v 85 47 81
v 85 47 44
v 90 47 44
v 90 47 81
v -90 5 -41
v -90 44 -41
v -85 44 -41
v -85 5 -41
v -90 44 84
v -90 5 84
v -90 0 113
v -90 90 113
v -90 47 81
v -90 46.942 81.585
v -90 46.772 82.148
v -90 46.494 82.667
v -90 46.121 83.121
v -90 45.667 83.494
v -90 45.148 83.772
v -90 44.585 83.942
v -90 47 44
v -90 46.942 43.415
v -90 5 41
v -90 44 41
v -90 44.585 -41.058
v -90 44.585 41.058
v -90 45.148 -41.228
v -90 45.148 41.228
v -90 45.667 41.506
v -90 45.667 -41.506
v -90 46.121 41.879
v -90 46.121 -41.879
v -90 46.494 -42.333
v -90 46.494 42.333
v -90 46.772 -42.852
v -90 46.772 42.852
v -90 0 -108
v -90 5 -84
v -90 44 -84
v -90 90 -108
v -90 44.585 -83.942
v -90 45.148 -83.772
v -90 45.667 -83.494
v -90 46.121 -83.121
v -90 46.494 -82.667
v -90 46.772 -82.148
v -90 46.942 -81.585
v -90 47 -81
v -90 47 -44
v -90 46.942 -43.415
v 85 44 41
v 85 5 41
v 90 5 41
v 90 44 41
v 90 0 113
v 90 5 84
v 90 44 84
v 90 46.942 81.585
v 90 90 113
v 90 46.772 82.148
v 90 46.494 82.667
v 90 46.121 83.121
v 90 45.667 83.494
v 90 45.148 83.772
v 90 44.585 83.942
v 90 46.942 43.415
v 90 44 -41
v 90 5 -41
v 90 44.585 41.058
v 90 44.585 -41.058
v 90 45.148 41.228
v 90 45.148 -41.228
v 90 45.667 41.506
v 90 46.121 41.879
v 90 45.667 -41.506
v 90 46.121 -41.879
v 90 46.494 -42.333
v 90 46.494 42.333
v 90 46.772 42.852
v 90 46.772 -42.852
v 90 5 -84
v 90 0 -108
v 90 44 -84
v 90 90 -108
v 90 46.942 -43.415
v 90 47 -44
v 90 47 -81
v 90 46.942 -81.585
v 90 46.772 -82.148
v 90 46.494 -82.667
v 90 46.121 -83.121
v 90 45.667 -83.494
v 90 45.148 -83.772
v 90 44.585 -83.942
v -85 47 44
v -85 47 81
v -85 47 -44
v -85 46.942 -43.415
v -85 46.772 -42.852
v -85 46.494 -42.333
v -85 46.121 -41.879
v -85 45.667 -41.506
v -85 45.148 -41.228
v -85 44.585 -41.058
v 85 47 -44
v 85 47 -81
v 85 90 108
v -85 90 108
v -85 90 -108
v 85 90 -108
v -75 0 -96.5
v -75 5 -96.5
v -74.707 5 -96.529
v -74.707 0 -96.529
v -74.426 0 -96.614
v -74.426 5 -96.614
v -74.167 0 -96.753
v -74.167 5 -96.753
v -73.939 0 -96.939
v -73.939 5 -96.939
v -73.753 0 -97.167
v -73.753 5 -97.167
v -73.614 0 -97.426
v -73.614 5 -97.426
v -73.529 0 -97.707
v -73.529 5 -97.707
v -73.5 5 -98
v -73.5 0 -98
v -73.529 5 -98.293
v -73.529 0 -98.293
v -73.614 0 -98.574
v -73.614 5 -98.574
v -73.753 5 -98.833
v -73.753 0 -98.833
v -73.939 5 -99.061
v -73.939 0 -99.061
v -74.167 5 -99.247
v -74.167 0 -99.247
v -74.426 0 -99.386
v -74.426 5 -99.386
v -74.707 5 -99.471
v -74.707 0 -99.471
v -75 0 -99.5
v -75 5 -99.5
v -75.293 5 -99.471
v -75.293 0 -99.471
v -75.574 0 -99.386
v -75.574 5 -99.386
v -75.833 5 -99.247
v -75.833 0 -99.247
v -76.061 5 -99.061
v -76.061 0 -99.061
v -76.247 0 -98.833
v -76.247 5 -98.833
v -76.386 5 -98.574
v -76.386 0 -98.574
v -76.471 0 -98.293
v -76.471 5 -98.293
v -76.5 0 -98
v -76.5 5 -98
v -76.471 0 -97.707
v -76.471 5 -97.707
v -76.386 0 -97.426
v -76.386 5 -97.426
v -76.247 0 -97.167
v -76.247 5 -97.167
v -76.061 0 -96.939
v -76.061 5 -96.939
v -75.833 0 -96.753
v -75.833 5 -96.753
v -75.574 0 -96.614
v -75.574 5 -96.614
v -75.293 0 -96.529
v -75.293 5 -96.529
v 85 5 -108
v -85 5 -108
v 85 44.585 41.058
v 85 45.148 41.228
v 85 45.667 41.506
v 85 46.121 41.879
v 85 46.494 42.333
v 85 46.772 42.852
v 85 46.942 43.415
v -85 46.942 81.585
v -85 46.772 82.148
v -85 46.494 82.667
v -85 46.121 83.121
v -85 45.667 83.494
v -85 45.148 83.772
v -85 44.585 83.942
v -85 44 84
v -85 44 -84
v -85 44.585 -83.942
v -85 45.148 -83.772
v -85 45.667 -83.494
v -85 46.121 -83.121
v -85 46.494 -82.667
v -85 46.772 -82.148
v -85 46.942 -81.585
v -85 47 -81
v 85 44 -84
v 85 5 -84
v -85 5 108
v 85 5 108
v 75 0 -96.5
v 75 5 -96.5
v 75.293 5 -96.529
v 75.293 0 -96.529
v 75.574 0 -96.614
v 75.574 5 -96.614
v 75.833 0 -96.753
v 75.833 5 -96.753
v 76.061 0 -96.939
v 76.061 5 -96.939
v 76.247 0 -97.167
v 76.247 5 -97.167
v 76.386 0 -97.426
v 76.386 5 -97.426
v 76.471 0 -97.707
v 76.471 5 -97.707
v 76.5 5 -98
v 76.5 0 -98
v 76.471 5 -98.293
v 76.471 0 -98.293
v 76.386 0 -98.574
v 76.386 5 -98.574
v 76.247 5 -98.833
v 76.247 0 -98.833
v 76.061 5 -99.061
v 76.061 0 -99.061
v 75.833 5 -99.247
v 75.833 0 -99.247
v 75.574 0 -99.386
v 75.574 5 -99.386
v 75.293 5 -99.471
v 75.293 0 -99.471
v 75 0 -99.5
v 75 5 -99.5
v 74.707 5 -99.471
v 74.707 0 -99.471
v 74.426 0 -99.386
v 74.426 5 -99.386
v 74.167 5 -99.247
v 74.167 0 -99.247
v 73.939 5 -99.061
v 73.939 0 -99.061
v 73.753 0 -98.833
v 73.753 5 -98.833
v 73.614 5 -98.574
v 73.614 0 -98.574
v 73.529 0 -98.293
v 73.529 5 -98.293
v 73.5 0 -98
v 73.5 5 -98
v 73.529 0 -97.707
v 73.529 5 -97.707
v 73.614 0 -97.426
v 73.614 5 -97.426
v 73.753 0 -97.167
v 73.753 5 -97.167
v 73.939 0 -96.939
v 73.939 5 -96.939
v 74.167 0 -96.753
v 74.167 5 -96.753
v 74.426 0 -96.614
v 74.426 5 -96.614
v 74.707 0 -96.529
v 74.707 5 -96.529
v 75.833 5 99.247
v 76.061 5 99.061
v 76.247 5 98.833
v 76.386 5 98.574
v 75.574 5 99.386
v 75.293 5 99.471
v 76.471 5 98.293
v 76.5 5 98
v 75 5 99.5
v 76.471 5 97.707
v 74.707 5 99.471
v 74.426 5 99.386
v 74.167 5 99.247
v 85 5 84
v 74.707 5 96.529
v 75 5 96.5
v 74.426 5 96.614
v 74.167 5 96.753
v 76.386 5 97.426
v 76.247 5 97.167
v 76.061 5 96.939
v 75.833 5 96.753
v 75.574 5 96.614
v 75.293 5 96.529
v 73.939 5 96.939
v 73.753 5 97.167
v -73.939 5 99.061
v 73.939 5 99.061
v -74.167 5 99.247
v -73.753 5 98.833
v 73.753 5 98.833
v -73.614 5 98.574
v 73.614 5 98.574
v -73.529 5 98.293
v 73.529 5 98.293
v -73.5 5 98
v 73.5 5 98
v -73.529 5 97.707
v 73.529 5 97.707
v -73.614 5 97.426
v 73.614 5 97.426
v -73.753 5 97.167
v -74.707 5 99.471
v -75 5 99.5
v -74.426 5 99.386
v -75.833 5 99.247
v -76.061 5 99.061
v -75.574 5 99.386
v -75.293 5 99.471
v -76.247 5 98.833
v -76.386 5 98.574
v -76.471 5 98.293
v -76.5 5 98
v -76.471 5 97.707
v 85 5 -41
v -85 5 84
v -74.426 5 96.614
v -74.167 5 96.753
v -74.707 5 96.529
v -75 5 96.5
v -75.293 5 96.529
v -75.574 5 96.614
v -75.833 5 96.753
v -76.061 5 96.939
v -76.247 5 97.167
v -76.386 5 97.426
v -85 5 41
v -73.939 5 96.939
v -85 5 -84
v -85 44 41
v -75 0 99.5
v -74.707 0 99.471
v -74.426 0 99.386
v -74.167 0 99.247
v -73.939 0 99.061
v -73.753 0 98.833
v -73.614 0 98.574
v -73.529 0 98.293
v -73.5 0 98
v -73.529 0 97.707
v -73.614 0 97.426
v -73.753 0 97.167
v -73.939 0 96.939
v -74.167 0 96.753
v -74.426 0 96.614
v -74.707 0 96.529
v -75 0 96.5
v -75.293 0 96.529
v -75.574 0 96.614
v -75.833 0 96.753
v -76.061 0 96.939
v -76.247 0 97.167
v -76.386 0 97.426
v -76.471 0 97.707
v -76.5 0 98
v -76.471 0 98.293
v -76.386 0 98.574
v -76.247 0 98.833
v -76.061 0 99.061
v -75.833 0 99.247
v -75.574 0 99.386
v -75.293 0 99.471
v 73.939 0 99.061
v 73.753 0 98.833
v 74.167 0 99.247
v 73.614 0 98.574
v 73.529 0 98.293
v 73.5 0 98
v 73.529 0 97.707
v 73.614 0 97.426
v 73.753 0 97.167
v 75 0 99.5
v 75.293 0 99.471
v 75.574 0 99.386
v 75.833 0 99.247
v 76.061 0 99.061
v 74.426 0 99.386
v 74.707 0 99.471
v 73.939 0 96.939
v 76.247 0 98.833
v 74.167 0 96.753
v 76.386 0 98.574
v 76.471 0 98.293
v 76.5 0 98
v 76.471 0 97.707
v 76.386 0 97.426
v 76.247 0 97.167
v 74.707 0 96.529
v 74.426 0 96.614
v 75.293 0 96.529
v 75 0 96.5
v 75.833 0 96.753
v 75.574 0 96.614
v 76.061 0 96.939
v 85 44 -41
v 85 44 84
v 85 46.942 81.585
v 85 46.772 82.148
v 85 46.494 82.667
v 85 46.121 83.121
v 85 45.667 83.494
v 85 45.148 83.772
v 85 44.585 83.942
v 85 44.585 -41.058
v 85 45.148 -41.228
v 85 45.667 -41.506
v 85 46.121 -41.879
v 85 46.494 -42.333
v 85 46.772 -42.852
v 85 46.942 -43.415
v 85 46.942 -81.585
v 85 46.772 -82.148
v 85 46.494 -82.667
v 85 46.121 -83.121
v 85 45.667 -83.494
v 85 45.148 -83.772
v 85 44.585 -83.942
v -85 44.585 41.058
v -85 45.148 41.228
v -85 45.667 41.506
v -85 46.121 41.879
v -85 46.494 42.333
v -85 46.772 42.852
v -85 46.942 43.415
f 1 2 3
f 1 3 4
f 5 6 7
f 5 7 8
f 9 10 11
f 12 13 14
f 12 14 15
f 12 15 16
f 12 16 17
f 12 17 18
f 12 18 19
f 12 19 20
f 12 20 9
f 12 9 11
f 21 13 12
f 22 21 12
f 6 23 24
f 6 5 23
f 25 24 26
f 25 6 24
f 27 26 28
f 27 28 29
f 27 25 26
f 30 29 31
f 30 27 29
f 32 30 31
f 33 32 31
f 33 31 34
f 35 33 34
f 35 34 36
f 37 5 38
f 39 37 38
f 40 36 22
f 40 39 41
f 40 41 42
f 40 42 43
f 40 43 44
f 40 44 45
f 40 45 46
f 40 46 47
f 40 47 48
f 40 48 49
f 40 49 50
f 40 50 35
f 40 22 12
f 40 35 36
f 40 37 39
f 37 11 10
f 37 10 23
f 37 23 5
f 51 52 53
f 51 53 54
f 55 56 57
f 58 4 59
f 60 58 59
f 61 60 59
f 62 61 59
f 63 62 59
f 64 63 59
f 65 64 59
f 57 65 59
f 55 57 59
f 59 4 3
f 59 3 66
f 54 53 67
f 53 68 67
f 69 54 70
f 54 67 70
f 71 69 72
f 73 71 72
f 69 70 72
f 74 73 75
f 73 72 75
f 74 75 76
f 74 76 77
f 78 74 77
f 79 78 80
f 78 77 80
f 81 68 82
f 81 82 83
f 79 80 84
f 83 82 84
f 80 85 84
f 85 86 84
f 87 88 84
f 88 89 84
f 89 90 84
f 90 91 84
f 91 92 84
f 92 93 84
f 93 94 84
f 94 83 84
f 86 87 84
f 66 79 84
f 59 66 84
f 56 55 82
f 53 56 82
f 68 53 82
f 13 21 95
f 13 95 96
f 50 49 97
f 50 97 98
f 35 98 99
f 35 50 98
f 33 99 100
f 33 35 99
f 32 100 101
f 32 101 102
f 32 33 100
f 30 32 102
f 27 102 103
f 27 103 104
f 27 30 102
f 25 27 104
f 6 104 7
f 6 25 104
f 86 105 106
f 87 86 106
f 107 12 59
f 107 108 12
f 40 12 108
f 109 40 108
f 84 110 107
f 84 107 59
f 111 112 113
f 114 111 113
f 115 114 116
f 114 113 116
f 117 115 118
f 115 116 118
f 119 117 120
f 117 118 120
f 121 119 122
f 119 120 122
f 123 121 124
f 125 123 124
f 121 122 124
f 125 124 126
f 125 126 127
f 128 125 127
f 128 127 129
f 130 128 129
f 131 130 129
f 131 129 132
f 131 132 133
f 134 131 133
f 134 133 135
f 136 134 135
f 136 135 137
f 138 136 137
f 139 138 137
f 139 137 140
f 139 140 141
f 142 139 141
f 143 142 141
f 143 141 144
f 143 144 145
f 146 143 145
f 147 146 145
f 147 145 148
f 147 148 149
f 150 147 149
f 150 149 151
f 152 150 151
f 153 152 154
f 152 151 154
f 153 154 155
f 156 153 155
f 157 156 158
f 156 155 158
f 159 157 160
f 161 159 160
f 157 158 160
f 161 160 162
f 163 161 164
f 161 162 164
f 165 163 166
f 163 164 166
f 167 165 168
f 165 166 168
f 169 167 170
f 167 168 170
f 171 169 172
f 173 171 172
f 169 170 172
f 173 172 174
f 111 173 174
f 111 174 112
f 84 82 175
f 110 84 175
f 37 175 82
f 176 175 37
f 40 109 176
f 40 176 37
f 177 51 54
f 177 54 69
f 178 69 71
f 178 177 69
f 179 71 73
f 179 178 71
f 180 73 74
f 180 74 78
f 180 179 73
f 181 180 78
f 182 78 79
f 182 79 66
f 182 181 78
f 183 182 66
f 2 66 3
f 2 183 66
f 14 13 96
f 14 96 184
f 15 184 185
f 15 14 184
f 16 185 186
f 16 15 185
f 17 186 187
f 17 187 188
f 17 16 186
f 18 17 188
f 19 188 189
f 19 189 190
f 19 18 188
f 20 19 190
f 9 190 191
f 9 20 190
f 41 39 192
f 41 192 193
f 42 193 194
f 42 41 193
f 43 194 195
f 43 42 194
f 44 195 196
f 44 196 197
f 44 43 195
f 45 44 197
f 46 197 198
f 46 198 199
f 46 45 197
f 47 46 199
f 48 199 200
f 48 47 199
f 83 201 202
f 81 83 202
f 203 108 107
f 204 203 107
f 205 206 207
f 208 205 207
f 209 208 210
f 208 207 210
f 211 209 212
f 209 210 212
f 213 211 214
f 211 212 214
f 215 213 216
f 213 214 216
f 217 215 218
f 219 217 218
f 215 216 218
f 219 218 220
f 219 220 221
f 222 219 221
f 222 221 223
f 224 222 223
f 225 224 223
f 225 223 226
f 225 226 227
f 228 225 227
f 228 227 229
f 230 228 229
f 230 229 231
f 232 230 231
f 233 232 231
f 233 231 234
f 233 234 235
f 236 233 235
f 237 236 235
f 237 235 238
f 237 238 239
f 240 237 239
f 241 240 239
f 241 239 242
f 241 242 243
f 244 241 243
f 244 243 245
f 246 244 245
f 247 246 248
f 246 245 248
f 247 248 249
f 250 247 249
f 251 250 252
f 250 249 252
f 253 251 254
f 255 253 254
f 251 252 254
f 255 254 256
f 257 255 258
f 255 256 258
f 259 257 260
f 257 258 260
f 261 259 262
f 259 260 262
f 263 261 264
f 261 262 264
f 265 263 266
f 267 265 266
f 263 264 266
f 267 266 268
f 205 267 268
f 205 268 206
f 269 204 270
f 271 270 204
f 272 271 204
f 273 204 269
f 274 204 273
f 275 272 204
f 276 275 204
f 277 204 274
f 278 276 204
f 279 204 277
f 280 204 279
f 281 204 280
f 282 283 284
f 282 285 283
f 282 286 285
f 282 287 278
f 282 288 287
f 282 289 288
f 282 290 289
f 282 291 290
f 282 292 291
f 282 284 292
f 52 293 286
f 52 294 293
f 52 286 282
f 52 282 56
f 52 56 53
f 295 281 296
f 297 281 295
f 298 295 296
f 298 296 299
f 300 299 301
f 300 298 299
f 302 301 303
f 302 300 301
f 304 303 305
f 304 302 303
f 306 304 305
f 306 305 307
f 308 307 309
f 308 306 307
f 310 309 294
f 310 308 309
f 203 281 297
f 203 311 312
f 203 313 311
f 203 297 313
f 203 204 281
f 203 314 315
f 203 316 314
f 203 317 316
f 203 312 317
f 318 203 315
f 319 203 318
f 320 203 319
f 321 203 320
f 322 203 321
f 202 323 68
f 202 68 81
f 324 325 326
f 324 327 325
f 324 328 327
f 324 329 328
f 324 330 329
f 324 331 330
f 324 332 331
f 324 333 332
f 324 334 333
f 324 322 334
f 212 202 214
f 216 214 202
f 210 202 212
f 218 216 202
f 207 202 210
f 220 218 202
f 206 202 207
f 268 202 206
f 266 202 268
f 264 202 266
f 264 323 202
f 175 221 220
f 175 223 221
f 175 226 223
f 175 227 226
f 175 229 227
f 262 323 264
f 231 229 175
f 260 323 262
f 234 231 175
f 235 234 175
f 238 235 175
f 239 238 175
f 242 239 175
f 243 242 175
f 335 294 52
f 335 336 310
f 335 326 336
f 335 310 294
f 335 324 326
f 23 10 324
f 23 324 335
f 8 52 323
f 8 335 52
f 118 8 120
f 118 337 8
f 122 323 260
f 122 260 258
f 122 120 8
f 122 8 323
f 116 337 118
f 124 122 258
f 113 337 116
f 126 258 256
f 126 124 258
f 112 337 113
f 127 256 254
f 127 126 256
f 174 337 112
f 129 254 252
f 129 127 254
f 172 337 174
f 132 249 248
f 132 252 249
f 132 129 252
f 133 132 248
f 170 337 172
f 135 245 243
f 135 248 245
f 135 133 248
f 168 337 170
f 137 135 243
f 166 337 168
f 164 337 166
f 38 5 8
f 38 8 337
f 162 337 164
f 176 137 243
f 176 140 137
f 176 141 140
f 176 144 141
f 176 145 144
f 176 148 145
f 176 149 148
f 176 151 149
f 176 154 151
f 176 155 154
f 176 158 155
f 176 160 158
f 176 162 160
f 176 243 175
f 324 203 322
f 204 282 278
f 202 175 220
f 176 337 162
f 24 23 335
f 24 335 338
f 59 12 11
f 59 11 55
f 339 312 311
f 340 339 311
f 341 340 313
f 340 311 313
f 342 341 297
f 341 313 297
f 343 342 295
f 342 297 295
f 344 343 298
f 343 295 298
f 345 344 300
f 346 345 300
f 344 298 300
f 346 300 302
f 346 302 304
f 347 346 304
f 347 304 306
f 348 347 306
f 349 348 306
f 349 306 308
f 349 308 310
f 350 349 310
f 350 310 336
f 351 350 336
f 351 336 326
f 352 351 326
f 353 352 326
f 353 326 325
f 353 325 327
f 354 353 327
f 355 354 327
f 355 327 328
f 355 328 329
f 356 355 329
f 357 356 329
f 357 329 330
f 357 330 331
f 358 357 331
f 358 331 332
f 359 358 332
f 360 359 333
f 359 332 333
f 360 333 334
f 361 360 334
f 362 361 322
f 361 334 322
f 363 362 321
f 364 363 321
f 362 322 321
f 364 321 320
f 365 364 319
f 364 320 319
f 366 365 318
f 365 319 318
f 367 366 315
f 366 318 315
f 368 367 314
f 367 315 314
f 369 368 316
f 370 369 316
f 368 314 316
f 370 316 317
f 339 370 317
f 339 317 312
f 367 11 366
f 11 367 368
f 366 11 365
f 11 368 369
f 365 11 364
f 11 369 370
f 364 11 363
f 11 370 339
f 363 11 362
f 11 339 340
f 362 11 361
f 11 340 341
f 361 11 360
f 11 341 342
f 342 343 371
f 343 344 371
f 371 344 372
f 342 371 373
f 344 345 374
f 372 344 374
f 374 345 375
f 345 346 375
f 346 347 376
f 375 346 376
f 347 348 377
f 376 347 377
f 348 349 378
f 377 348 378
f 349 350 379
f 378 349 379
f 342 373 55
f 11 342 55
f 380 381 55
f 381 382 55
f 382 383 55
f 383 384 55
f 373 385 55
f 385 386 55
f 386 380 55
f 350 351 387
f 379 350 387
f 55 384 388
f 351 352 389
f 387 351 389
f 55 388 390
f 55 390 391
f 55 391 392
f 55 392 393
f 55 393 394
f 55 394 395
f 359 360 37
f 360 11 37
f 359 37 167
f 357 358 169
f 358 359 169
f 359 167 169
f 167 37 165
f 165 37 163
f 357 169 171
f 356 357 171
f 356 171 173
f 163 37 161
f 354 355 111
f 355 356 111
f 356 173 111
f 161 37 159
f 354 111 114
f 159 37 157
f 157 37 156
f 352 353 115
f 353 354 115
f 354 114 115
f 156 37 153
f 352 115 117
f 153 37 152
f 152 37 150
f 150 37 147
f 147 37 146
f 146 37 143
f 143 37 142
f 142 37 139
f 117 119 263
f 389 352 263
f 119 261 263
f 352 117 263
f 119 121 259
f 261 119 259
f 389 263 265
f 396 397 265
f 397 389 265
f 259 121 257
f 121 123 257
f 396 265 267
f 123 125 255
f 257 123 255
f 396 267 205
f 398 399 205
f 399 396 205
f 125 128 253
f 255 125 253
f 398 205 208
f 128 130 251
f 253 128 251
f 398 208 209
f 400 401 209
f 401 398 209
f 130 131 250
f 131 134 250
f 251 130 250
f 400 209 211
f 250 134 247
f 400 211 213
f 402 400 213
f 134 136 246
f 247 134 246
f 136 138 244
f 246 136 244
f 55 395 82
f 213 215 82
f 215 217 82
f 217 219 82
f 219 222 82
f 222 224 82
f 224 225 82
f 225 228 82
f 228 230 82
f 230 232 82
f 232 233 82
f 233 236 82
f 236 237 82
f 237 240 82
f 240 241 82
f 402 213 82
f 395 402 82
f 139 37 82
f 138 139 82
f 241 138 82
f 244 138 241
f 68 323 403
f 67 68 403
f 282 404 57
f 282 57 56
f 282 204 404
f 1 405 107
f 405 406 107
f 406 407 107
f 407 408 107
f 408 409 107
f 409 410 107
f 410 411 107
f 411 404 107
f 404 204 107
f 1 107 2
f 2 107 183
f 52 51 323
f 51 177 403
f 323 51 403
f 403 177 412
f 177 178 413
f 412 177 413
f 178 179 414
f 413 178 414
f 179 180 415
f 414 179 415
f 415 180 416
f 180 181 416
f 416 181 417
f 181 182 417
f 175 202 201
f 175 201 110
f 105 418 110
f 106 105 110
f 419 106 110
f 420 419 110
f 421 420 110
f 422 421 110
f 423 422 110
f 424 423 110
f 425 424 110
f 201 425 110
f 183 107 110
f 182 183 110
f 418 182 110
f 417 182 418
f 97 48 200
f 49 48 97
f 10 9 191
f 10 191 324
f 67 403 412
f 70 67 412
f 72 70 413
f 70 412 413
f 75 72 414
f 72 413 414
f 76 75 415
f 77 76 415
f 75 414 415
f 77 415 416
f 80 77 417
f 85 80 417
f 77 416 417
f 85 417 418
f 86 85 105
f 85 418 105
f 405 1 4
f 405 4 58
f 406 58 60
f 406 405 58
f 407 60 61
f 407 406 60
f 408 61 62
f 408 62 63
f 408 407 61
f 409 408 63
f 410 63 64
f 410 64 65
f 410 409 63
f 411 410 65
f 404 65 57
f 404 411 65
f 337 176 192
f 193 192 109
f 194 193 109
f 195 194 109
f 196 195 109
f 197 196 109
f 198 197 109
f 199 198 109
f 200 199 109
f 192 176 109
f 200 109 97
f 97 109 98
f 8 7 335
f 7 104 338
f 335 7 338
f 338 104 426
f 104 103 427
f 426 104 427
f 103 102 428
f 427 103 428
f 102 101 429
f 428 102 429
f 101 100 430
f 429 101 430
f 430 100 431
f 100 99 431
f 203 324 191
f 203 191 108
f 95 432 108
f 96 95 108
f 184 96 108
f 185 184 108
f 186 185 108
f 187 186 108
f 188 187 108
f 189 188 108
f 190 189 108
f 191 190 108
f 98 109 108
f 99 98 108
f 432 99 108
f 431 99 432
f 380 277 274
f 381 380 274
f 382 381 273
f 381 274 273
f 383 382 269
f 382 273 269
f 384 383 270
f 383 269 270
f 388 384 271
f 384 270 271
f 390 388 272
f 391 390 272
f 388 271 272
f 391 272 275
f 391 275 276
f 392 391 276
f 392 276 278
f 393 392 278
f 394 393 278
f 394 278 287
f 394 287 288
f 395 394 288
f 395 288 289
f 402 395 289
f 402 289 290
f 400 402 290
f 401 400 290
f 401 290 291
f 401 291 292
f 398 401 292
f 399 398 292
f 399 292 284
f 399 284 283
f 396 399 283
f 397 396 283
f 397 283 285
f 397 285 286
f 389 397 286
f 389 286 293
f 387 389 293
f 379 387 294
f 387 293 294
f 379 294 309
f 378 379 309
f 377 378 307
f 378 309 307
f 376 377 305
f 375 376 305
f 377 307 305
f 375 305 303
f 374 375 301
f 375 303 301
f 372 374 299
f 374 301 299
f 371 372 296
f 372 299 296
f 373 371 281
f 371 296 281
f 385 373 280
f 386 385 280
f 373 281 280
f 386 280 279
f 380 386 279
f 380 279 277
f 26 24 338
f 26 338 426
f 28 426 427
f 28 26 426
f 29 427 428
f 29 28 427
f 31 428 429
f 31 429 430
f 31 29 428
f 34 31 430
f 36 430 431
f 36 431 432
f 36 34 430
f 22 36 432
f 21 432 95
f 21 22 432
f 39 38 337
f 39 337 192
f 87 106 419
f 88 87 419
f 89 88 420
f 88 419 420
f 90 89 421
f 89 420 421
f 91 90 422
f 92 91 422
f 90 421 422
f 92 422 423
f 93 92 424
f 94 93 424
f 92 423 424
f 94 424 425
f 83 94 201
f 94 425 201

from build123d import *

# Parameters (mm, degrees)
SKETCH1_W           = 170
SKETCH1_H           = 216
BOSS_EXTRUDE1_DEPTH = 5
SKETCH2_R           = 1.5
CUT_EXTRUDE1_DEPTH  = 138.528178931
SKETCH9_W           = 170
SKETCH9_H           = 90
BOSS_EXTRUDE2_DEPTH = 3
SKETCH10_W          = 219
SKETCH10_H          = 90
BOSS_EXTRUDE3_DEPTH = 5
BOSS_EXTRUDE5_START = 5
SKETCH11_W          = 219
SKETCH11_H          = 90
BOSS_EXTRUDE5_DEPTH = 5
SKETCH14_W          = 180
SKETCH14_H          = 90
CUT_EXTRUDE2_DEPTH  = 3
SKETCH15_W          = 180
SKETCH15_H          = 90
BOSS_EXTRUDE6_DEPTH = 5


with BuildPart() as part:
    # Sketch1 → Boss-Extrude1 (new body)
    with BuildSketch(Plane(origin=(0, 0, 0), x_dir=(1, 0, 0), z_dir=(0, 1, 0))):
        Rectangle(SKETCH1_W, SKETCH1_H)
    extrude(amount=BOSS_EXTRUDE1_DEPTH)

    # Sketch2 → Cut-Extrude1 (cut, through all)
    with BuildSketch(Plane(origin=(0, 5, 0), x_dir=(1, 0, 0), z_dir=(0, 1, 0))):
        with Locations(Location((-75, 98, 0), (0, 0, 270))):
            Circle(SKETCH2_R)
        with Locations(Location((75, 98, 0), (0, 0, 270))):
            Circle(SKETCH2_R)
        with Locations(Location((-75, -98, 0), (0, 0, 270))):
            Circle(SKETCH2_R)
        with Locations(Location((75, -98, 0), (0, 0, 270))):
            Circle(SKETCH2_R)
    extrude(amount=-CUT_EXTRUDE1_DEPTH, mode=Mode.SUBTRACT)

    # Sketch9 → Boss-Extrude2 (add)
    with BuildSketch(Plane(origin=(0, 0, -108), x_dir=(-1, 0, 0), z_dir=(0, 0, -1))):
        with Locations((0, 45)):
            Rectangle(SKETCH9_W, SKETCH9_H)
    extrude(amount=BOSS_EXTRUDE2_DEPTH)

    # Sketch10 → Boss-Extrude3 (add)
    with BuildSketch(Plane(origin=(85, 0, 0), x_dir=(0, 0, -1), z_dir=(1, 0, 0))):
        with Locations((1.5, 45)):
            Rectangle(SKETCH10_W, SKETCH10_H)
        with BuildLine():
            Line((-84, 5), (-41, 5))
            Line((-41, 5), (-41, 44))
            ThreePointArc((-41, 44), (-41.878679656, 46.121320344), (-44, 47))
            Line((-44, 47), (-81, 47))
            ThreePointArc((-81, 47), (-83.121320344, 46.121320344), (-84, 44))
            Line((-84, 44), (-84, 5))
        make_face(mode=Mode.SUBTRACT)
        with BuildLine():
            Line((84, 5), (41, 5))
            Line((41, 5), (41, 44))
            ThreePointArc((41, 44), (41.878679656, 46.121320344), (44, 47))
            Line((44, 47), (81, 47))
            ThreePointArc((81, 47), (83.121320344, 46.121320344), (84, 44))
            Line((84, 44), (84, 5))
        make_face(mode=Mode.SUBTRACT)
    extrude(amount=BOSS_EXTRUDE3_DEPTH)

    # Sketch11 → Boss-Extrude5 (add)
    with BuildSketch(Plane.ZY.offset(85).offset(BOSS_EXTRUDE5_START)):
        with Locations((-1.5, 45)):
            Rectangle(SKETCH11_W, SKETCH11_H)
        with BuildLine():
            Line((-84, 5), (-84, 44))
            ThreePointArc((-84, 44), (-83.121320344, 46.121320344), (-81, 47))
            Line((-81, 47), (-44, 47))
            ThreePointArc((-44, 47), (-41.878679656, 46.121320344), (-41, 44))
            Line((-41, 44), (-41, 5))
            Line((-41, 5), (-84, 5))
        make_face(mode=Mode.SUBTRACT)
        with BuildLine():
            Line((41, 5), (41, 44))
            ThreePointArc((41, 44), (41.878679656, 46.121320344), (44, 47))
            Line((44, 47), (81, 47))
            ThreePointArc((81, 47), (83.121320344, 46.121320344), (84, 44))
            Line((84, 44), (84, 5))
            Line((84, 5), (41, 5))
        make_face(mode=Mode.SUBTRACT)
    extrude(amount=-BOSS_EXTRUDE5_DEPTH)

    # Sketch14 → Cut-Extrude2 (cut)
    with BuildSketch(Plane(origin=(0, 0, -111), x_dir=(-1, 0, 0), z_dir=(0, 0, -1))):
        with Locations((0, 45)):
            Rectangle(SKETCH14_W, SKETCH14_H)
    extrude(amount=-CUT_EXTRUDE2_DEPTH, mode=Mode.SUBTRACT)

    # Sketch15 → Boss-Extrude6 (add)
    with BuildSketch(Plane.XY.offset(108)):
        with Locations((0, 45)):
            Rectangle(SKETCH15_W, SKETCH15_H)
    extrude(amount=BOSS_EXTRUDE6_DEPTH)


solid = part.part
